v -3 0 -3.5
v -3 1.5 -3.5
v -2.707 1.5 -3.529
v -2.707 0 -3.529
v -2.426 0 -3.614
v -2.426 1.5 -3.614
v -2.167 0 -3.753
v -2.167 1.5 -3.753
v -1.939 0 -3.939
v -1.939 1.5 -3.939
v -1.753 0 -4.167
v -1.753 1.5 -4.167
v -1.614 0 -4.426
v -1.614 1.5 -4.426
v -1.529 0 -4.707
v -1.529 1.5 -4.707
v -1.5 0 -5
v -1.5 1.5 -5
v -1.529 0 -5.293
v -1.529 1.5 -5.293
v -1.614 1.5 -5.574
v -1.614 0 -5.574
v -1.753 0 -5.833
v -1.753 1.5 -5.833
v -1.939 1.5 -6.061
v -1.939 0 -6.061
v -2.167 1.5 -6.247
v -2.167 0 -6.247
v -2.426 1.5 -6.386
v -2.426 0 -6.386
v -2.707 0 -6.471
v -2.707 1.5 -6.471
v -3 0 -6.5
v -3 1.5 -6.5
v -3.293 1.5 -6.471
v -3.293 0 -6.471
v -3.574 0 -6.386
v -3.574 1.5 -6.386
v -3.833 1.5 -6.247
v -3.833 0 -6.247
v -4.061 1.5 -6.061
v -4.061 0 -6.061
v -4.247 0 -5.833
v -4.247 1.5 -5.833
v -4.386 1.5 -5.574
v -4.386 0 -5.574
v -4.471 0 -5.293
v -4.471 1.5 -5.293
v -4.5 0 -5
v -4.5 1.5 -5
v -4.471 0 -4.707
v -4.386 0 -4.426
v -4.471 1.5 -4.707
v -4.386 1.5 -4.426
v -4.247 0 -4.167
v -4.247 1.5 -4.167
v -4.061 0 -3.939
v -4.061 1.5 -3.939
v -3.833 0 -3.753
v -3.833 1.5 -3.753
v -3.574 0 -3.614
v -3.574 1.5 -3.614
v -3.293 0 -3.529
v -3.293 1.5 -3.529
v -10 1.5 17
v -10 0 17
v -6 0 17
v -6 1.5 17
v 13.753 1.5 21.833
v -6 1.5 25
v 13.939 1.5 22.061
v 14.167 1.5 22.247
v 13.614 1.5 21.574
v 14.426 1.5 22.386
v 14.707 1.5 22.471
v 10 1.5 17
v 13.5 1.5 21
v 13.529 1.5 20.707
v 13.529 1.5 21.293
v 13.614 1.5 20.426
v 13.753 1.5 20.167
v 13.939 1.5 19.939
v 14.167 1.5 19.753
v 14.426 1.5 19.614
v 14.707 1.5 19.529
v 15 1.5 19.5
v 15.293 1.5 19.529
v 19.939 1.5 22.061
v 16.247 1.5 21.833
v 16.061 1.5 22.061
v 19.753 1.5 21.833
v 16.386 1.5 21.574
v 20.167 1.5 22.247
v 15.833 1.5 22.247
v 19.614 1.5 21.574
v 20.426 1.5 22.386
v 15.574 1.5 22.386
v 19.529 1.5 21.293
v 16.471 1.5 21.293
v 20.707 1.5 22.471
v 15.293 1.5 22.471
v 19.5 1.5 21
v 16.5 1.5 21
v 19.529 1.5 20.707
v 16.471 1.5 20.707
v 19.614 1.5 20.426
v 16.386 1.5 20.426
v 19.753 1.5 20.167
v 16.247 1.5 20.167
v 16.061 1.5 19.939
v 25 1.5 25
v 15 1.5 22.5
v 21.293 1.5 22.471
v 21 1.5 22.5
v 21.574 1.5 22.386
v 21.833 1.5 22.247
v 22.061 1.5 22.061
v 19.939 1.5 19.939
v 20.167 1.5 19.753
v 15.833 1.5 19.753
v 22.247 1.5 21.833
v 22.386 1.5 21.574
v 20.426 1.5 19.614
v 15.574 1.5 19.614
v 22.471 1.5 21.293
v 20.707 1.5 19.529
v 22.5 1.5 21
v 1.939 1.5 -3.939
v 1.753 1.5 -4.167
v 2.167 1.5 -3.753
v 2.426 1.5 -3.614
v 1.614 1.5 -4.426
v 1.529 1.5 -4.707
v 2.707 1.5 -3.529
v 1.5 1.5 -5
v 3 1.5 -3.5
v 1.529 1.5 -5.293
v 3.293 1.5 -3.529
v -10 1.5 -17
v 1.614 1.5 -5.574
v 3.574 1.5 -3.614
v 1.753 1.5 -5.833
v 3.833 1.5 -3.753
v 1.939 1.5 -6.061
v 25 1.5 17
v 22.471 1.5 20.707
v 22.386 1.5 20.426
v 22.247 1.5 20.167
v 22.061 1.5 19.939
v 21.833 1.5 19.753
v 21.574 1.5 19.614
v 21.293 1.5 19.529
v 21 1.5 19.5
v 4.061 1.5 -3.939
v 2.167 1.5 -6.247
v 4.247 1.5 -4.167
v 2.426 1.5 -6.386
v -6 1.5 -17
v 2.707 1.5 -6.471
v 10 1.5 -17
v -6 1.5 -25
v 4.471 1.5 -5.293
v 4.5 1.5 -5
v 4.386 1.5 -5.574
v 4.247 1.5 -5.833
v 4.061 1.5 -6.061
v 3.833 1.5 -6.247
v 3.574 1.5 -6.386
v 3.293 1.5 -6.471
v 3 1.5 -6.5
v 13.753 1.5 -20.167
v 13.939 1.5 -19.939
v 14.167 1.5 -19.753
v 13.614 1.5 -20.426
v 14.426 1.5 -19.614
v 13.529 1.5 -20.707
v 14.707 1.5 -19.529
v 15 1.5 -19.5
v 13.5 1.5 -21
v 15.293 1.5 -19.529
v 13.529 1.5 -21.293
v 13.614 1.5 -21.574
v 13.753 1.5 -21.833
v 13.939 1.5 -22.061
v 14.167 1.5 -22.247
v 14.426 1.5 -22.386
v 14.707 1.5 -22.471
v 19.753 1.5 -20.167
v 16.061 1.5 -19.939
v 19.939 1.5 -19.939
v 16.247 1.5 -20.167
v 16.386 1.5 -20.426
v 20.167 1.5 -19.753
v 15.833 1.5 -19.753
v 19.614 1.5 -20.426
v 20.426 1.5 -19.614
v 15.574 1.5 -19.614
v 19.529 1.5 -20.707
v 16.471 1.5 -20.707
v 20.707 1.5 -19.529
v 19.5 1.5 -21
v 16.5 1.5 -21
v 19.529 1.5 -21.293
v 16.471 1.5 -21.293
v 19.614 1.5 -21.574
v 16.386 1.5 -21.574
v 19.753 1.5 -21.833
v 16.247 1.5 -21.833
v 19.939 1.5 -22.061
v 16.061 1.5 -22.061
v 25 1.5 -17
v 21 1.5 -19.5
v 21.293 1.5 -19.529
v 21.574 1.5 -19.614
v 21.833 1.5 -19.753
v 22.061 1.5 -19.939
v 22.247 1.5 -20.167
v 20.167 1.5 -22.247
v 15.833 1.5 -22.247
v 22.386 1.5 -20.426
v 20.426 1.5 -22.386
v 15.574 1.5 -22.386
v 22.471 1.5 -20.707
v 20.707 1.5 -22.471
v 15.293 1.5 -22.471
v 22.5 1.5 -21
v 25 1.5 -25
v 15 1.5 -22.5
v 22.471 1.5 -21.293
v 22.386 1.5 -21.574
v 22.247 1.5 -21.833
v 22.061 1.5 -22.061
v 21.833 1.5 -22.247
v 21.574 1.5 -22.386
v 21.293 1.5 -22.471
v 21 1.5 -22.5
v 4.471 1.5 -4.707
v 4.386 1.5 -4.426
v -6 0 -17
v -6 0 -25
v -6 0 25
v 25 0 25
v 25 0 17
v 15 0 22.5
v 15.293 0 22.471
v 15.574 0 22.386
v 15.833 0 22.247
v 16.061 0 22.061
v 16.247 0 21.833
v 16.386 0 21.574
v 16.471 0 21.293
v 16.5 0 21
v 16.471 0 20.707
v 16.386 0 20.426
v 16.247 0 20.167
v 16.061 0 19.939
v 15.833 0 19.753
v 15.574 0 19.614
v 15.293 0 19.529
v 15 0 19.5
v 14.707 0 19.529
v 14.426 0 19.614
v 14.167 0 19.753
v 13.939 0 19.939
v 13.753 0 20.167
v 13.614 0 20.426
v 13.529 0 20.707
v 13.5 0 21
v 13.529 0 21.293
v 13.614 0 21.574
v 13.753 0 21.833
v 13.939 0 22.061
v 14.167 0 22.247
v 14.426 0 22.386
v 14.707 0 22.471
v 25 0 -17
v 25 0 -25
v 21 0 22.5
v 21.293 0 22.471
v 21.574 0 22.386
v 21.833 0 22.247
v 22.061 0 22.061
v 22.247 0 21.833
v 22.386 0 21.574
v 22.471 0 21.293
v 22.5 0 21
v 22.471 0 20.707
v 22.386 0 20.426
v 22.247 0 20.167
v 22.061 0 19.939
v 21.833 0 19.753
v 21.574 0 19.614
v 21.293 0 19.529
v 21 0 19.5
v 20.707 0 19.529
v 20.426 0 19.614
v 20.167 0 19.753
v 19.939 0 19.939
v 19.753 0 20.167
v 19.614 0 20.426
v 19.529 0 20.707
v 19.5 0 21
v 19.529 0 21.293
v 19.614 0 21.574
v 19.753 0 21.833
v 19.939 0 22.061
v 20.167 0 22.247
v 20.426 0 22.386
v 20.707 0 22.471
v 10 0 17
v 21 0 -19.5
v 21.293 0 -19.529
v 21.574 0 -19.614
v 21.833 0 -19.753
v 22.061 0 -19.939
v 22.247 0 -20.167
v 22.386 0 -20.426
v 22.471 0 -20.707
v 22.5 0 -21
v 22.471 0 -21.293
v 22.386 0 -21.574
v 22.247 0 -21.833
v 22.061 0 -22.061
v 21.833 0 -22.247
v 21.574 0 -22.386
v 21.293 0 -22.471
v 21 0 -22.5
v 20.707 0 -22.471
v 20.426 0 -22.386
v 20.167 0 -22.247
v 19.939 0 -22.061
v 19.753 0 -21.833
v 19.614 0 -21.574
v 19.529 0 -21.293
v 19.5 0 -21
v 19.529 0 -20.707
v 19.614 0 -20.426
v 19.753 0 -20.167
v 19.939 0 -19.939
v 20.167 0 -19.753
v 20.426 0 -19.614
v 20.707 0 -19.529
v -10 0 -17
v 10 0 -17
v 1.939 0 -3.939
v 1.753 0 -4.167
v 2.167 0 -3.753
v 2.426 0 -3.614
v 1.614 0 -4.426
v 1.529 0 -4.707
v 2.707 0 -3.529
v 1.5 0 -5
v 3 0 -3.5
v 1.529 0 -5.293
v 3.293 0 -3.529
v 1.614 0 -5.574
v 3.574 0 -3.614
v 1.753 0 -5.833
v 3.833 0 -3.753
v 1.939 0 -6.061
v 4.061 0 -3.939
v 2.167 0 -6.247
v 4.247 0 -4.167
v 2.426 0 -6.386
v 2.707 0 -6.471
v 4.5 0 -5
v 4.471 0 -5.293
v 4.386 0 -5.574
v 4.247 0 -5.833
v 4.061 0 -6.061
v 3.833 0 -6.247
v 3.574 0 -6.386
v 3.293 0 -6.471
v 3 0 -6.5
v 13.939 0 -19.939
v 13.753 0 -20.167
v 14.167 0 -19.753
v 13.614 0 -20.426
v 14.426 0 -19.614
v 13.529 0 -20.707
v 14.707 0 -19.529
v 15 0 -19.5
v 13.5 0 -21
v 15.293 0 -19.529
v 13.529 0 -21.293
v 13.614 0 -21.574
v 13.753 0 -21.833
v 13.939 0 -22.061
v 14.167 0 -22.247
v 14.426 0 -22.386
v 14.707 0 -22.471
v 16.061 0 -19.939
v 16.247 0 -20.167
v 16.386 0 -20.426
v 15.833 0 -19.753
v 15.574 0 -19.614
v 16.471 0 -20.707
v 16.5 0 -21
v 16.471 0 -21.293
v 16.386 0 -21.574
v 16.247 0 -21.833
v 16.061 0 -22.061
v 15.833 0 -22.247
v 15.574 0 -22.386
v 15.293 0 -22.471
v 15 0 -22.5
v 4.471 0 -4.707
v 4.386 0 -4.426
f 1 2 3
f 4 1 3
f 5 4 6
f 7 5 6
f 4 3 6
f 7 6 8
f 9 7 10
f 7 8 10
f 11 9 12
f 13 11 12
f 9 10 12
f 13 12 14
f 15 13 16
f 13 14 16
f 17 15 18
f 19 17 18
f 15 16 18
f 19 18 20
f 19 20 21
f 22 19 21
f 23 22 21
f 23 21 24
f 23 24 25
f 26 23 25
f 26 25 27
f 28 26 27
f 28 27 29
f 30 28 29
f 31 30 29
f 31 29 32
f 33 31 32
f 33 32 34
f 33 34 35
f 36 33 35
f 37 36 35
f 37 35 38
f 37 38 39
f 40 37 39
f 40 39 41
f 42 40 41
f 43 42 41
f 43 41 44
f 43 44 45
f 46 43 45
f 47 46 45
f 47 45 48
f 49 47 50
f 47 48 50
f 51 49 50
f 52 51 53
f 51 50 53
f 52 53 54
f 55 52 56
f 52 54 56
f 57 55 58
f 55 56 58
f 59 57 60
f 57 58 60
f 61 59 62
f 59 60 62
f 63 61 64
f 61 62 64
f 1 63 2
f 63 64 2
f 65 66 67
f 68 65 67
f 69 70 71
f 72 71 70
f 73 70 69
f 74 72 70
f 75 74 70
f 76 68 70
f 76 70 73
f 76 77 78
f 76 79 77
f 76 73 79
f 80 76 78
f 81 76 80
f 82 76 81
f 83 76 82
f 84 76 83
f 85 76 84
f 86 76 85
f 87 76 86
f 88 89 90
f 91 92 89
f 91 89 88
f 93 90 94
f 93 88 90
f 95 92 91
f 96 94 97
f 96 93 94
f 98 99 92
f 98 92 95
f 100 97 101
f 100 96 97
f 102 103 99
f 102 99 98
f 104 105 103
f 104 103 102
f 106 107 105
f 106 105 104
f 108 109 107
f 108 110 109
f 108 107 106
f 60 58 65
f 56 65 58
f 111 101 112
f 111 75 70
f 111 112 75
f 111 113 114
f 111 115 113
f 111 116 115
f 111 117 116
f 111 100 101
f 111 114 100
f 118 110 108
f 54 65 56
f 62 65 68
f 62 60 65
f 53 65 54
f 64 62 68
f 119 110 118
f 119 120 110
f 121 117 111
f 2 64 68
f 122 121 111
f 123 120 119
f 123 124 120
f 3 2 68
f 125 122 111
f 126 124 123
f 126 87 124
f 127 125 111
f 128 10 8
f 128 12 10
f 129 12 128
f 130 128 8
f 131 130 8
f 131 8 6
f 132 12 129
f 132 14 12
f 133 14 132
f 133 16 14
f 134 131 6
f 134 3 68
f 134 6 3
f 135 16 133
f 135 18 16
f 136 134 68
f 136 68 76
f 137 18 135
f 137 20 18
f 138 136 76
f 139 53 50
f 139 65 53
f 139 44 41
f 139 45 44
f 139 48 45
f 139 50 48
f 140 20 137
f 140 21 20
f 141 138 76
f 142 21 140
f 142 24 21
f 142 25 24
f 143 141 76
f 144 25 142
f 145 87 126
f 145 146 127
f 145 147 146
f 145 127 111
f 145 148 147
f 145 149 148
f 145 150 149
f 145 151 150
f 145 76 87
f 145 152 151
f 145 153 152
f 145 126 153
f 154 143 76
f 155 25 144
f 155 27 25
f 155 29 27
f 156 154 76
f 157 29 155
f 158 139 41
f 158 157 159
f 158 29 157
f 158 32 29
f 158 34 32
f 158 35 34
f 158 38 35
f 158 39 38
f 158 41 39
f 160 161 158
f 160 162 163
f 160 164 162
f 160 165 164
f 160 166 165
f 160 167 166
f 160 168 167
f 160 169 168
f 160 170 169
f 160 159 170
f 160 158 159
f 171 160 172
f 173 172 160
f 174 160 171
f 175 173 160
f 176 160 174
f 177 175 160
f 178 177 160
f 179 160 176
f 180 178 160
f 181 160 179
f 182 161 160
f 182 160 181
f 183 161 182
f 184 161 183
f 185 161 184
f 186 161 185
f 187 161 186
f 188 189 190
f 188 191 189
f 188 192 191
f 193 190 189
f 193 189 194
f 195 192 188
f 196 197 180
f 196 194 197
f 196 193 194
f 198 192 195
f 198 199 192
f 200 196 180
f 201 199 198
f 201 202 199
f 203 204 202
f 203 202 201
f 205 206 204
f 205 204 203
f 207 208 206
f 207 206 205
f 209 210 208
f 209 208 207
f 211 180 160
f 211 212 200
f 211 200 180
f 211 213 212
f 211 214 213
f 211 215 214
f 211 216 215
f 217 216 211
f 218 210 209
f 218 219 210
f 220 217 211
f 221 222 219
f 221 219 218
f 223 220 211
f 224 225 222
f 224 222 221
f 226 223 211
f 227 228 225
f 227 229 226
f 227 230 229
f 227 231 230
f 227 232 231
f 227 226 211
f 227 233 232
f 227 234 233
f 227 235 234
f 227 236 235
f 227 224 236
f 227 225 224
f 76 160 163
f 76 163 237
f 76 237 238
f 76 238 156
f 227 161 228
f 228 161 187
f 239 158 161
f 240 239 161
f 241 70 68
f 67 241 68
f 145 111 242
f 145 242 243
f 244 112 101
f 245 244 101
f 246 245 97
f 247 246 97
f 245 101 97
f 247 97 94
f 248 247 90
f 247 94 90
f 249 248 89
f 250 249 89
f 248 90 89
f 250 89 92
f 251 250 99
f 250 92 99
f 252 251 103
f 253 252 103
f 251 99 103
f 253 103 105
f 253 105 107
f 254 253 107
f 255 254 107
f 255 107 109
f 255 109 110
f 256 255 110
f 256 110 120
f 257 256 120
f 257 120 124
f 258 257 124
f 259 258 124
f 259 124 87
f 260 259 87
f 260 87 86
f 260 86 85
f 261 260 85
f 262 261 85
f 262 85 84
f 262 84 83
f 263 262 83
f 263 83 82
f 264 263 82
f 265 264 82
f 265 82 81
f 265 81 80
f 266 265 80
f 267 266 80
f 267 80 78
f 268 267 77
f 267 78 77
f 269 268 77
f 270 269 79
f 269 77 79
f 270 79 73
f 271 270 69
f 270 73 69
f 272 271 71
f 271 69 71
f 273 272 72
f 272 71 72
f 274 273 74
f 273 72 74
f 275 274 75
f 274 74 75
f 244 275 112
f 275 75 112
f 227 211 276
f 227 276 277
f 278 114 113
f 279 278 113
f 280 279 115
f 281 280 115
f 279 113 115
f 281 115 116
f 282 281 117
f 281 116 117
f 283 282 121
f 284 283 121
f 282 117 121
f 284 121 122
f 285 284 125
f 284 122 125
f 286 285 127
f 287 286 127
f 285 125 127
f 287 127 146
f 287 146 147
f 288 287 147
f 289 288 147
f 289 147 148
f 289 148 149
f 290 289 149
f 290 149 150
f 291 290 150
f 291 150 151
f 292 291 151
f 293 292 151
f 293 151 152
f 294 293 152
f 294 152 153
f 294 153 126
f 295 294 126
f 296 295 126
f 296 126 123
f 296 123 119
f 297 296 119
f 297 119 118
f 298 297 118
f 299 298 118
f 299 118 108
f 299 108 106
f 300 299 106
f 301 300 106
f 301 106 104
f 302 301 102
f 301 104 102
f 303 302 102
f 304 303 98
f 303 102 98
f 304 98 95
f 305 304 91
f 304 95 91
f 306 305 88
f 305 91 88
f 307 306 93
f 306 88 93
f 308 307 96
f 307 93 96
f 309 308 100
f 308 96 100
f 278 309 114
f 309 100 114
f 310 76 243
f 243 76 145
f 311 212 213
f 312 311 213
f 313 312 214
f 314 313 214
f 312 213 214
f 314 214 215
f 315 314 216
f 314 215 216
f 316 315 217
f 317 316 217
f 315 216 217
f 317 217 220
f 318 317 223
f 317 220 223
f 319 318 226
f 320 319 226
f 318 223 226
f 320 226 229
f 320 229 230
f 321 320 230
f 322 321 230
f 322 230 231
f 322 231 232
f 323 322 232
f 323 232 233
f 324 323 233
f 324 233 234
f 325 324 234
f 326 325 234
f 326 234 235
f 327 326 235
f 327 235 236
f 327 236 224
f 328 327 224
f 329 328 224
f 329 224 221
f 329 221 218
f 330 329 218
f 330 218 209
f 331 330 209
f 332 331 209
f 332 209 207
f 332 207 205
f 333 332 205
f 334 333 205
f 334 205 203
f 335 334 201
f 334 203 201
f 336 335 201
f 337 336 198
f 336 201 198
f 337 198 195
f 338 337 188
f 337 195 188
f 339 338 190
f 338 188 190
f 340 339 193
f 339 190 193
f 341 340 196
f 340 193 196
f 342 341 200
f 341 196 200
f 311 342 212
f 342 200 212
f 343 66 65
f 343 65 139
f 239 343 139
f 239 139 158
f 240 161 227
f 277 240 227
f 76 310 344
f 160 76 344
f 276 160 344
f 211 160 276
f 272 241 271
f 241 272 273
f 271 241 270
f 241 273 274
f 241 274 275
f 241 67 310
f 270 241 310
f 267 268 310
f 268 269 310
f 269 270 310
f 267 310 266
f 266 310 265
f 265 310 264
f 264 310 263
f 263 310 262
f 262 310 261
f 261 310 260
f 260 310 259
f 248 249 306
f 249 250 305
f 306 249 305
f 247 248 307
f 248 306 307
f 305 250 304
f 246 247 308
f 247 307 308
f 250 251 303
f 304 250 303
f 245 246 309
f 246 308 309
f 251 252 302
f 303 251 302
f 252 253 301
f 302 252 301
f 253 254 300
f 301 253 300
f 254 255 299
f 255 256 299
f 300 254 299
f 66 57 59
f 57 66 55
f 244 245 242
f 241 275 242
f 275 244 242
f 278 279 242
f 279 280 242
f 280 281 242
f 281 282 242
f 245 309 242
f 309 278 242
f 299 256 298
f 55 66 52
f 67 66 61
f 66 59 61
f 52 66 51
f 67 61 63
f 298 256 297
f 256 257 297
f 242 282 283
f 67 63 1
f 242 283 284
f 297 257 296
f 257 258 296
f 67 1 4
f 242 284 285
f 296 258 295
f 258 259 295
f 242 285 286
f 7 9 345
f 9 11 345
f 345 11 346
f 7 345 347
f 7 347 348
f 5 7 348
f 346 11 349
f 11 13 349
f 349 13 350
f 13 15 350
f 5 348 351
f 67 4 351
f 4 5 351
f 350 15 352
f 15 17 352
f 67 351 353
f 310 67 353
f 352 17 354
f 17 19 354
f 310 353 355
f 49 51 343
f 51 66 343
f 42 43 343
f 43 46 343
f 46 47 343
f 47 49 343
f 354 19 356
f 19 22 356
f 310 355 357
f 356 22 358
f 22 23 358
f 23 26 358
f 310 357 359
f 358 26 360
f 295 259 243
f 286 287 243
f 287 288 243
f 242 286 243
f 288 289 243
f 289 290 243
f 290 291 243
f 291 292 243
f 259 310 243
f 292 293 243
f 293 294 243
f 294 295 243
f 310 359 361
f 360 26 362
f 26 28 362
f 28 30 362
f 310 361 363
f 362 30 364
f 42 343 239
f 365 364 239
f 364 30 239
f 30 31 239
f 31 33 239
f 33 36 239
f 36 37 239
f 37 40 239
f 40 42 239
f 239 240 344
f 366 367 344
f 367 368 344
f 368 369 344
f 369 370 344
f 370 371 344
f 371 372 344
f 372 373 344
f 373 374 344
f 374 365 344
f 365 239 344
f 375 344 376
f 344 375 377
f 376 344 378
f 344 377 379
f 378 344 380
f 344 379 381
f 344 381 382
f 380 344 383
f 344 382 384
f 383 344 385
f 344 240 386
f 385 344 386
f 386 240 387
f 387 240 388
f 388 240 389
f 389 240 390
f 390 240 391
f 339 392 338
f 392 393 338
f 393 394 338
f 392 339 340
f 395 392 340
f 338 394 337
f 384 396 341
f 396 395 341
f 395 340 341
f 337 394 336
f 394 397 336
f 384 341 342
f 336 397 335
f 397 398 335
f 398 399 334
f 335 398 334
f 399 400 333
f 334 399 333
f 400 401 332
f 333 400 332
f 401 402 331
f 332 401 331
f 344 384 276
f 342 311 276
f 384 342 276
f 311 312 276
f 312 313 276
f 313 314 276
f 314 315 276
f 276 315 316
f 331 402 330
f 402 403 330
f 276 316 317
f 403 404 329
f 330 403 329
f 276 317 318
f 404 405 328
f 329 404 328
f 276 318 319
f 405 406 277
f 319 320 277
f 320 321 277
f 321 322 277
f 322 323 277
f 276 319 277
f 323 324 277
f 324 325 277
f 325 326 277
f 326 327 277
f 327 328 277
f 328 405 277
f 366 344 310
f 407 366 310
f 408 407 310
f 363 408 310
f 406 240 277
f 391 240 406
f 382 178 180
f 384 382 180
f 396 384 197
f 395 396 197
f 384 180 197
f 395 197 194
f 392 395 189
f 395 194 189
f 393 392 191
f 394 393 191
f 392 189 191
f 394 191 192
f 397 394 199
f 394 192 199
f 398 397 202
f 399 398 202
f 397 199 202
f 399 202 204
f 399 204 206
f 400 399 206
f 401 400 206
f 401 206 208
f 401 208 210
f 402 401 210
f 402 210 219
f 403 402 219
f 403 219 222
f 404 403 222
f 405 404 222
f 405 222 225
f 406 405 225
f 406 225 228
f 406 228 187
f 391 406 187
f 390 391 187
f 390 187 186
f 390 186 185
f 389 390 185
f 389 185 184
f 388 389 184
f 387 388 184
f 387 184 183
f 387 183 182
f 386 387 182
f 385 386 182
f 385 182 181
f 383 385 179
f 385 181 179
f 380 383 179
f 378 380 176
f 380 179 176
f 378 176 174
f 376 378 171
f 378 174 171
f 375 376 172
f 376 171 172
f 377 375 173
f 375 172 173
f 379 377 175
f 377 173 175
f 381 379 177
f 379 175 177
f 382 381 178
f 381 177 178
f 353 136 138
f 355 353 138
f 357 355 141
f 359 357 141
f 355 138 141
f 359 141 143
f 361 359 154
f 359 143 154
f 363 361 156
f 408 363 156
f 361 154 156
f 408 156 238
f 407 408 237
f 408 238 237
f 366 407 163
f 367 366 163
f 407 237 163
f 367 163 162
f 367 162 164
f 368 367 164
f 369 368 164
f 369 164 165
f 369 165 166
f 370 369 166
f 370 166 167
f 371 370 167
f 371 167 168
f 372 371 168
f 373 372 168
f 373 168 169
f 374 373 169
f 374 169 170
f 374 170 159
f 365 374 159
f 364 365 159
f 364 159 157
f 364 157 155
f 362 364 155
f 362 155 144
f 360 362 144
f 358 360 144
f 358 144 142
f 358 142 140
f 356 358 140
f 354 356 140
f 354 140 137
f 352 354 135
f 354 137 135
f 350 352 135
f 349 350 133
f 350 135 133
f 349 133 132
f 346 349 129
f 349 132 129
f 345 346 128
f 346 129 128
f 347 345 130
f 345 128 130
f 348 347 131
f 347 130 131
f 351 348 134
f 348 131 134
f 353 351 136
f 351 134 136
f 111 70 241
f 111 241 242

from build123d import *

# Parameters (mm, degrees)
SKETCH1_W          = 20
SKETCH1_H          = 34
BASE_FLANGE1_DEPTH = 1.5
SKETCH2_W          = 31
SKETCH2_H          = 8
TAB1_DEPTH         = 1.5
SKETCH4_R          = 1.5
CUT_EXTRUDE1_DEPTH = 10
SKETCH5_R          = 1.5
CUT_EXTRUDE2_DEPTH = 10


# Sheet-metal steps are written as plain solids
with BuildPart() as part:
    # Sketch1 → Base-Flange1 (new body)
    with BuildSketch(Plane(origin=(0, 0, 0), x_dir=(1, 0, 0), z_dir=(0, 1, 0))):
        Rectangle(SKETCH1_W, SKETCH1_H)
    extrude(amount=BASE_FLANGE1_DEPTH)

    # Sketch2 → Tab1 (add)
    with BuildSketch(Plane(origin=(0, 1.5, 0), x_dir=(1, 0, 0), z_dir=(0, 1, 0))):
        with Locations((9.5, -21)):
            Rectangle(SKETCH2_W, SKETCH2_H)
        with Locations((9.5, 21)):
            Rectangle(SKETCH2_W, SKETCH2_H)
    extrude(amount=-TAB1_DEPTH)

    # Sketch4 → Cut-Extrude1 (cut)
    with BuildSketch(Plane(origin=(0, 1.5, 0), x_dir=(1, 0, 0), z_dir=(0, 1, 0))):
        with Locations(Location((-3, 5, 0), (0, 0, 270))):
            Circle(SKETCH4_R)
        with Locations(Location((3, 5, 0), (0, 0, 270))):
            Circle(SKETCH4_R)
    extrude(amount=-CUT_EXTRUDE1_DEPTH, mode=Mode.SUBTRACT)

    # Sketch5 → Cut-Extrude2 (cut)
    with BuildSketch(Plane(origin=(0, 1.5, 0), x_dir=(1, 0, 0), z_dir=(0, 1, 0))):
        with Locations(Location((21, 21, 0), (0, 0, 270))):
            Circle(SKETCH5_R)
        with Locations(Location((15, 21, 0), (0, 0, 270))):
            Circle(SKETCH5_R)
        with Locations(Location((15, -21, 0), (0, 0, 270))):
            Circle(SKETCH5_R)
        with Locations(Location((21, -21, 0), (0, 0, 270))):
            Circle(SKETCH5_R)
    extrude(amount=-CUT_EXTRUDE2_DEPTH, mode=Mode.SUBTRACT)


solid = part.part
